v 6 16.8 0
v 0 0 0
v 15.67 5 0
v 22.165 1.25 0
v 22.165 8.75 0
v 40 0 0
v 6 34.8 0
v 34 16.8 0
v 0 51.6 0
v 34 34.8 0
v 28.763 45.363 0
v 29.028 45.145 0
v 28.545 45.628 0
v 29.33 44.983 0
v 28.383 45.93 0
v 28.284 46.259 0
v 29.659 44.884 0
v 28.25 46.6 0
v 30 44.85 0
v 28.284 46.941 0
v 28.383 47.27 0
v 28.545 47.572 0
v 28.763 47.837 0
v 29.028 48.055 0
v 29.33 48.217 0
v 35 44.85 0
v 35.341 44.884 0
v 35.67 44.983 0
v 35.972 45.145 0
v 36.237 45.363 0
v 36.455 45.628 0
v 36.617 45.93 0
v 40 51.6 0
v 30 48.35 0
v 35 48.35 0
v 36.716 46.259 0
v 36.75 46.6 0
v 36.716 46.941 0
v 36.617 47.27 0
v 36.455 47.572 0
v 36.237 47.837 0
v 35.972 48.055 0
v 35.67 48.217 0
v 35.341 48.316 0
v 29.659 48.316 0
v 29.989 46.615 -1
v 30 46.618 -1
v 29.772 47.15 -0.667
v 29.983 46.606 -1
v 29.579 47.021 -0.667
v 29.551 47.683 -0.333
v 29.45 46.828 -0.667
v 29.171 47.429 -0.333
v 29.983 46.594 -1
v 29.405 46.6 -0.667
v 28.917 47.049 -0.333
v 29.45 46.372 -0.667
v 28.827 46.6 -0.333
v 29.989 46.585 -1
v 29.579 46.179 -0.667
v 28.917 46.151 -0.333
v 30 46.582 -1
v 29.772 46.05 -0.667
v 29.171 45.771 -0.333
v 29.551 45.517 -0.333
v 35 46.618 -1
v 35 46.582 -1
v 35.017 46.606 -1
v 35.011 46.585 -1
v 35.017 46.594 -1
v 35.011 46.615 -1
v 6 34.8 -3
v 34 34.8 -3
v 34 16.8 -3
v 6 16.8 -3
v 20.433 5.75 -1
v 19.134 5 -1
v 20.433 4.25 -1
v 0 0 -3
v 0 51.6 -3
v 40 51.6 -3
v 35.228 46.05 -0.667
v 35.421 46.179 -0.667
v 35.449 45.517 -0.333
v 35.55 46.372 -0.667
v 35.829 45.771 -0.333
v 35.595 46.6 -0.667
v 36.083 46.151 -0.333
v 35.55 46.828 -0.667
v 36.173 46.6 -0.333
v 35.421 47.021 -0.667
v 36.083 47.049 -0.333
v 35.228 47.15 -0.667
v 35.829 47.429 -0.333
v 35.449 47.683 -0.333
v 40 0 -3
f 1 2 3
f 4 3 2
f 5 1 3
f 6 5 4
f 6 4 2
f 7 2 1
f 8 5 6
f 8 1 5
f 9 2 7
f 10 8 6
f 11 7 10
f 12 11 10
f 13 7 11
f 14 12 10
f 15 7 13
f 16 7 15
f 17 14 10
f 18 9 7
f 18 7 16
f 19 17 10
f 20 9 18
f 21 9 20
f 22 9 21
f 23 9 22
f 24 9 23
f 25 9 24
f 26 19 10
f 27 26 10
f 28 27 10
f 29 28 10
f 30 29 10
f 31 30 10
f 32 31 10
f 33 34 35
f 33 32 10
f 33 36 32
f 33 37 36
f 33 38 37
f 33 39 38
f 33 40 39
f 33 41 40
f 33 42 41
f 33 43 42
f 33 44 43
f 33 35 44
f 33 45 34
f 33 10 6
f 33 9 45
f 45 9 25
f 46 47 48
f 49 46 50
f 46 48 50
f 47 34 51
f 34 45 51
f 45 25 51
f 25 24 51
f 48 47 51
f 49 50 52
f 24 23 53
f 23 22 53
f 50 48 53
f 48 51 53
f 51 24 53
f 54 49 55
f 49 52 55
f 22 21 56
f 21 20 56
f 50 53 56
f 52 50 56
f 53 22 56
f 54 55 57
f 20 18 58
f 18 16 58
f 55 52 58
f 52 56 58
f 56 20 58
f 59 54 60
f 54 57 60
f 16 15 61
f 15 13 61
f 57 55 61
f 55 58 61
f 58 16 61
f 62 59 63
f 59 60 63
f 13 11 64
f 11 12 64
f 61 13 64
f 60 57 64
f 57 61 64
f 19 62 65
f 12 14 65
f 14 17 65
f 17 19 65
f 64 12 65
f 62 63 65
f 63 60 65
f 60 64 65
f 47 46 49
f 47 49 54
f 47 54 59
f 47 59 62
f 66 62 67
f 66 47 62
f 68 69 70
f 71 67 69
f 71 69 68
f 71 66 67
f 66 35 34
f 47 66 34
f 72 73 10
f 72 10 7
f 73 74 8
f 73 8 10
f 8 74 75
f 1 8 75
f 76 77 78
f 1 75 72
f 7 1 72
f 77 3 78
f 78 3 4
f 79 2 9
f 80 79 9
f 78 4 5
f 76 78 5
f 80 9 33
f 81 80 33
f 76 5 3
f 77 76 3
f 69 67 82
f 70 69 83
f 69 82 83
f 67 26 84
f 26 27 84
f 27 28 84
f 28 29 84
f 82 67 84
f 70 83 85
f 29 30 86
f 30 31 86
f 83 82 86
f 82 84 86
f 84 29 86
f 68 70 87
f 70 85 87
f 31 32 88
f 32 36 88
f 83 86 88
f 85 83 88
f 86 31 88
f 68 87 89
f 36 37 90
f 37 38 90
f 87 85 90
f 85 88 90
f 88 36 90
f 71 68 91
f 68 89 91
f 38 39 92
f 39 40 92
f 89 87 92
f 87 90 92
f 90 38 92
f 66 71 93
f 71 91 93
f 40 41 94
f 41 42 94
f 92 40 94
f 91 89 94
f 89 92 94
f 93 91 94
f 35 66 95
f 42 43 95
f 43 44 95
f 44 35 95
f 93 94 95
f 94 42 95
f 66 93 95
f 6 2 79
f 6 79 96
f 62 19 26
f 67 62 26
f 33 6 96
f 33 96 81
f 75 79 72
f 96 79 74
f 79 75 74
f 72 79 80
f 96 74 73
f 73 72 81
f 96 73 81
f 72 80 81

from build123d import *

# Parameters (mm, degrees)
SKETCH1_W           = 40
SKETCH1_H           = 51.6
BOSS_EXTRUDE1_DEPTH = 3
SKETCH2_W           = 28
SKETCH2_H           = 18
CUT_EXTRUDE1_DEPTH  = 66.357172521
CUT_EXTRUDE2_DEPTH  = 1
CUT_EXTRUDE2_DRAFT  = -60
CUT_EXTRUDE3_DEPTH  = 1
CUT_EXTRUDE3_DRAFT  = -60


with BuildPart() as part:
    # Sketch1 → Boss-Extrude1 (new body)
    with BuildSketch(Plane.XY):
        with Locations((20, 25.8)):
            Rectangle(SKETCH1_W, SKETCH1_H)
    extrude(amount=-BOSS_EXTRUDE1_DEPTH)

    # Sketch2 → Cut-Extrude1 (cut, through all)
    with BuildSketch(Plane(origin=(0, 0, -3), x_dir=(-1, 0, 0), z_dir=(0, 0, -1))):
        with Locations((-20, 25.8)):
            Rectangle(SKETCH2_W, SKETCH2_H)
    extrude(amount=-CUT_EXTRUDE1_DEPTH, mode=Mode.SUBTRACT)


with BuildPart() as cut_extrude2_tool:
    # Sketch3 → Cut-Extrude2 (with draft: the straight prism first)
    with BuildSketch(Plane.XY):
        with BuildLine():
            Line((35, 48.35), (30, 48.35))
            ThreePointArc((30, 48.35), (28.25, 46.6), (30, 44.85))
            Line((30, 44.85), (35, 44.85))
            ThreePointArc((35, 44.85), (36.75, 46.6), (35, 48.35))
        make_face()
    extrude(amount=-CUT_EXTRUDE2_DEPTH)
    # Cut-Extrude2: the draft: its side faces are tilted about the plane it starts from
    cut_extrude2_sides = [cut_extrude2_tool.faces().sort_by_distance(p)[0] for p in [
        (32.5, 48.35, -0.5),
        (28.25, 46.6, -0.5),
        (32.5, 44.85, -0.5),
        (36.75, 46.6, -0.5),
    ]]
    draft(cut_extrude2_sides, Plane.XY, CUT_EXTRUDE2_DRAFT)


with BuildPart() as part_1:
    add(part.part)

    # Cut-Extrude2: cut by cut_extrude2_tool
    add(cut_extrude2_tool.part, mode=Mode.SUBTRACT)


with BuildPart() as cut_extrude3_tool:
    # Sketch4 → Cut-Extrude3 (with draft: the straight prism first)
    with BuildSketch(Plane.XY):
        Polygon((15.669872981, 5), (22.165063509, 1.25), (22.165063509, 8.75), align=None)
    extrude(amount=-CUT_EXTRUDE3_DEPTH)
    # Cut-Extrude3: the draft: its side faces are tilted about the plane it starts from
    cut_extrude3_sides = [cut_extrude3_tool.faces().sort_by_distance(p)[0] for p in [
        (18.917468245, 3.125, -0.5),
        (22.165063509, 5, -0.5),
        (18.917468245, 6.875, -0.5),
    ]]
    draft(cut_extrude3_sides, Plane.XY, CUT_EXTRUDE3_DRAFT)


with BuildPart() as part_2:
    add(part_1.part)

    # Cut-Extrude3: cut by cut_extrude3_tool
    add(cut_extrude3_tool.part, mode=Mode.SUBTRACT)


solid = part_2.part
